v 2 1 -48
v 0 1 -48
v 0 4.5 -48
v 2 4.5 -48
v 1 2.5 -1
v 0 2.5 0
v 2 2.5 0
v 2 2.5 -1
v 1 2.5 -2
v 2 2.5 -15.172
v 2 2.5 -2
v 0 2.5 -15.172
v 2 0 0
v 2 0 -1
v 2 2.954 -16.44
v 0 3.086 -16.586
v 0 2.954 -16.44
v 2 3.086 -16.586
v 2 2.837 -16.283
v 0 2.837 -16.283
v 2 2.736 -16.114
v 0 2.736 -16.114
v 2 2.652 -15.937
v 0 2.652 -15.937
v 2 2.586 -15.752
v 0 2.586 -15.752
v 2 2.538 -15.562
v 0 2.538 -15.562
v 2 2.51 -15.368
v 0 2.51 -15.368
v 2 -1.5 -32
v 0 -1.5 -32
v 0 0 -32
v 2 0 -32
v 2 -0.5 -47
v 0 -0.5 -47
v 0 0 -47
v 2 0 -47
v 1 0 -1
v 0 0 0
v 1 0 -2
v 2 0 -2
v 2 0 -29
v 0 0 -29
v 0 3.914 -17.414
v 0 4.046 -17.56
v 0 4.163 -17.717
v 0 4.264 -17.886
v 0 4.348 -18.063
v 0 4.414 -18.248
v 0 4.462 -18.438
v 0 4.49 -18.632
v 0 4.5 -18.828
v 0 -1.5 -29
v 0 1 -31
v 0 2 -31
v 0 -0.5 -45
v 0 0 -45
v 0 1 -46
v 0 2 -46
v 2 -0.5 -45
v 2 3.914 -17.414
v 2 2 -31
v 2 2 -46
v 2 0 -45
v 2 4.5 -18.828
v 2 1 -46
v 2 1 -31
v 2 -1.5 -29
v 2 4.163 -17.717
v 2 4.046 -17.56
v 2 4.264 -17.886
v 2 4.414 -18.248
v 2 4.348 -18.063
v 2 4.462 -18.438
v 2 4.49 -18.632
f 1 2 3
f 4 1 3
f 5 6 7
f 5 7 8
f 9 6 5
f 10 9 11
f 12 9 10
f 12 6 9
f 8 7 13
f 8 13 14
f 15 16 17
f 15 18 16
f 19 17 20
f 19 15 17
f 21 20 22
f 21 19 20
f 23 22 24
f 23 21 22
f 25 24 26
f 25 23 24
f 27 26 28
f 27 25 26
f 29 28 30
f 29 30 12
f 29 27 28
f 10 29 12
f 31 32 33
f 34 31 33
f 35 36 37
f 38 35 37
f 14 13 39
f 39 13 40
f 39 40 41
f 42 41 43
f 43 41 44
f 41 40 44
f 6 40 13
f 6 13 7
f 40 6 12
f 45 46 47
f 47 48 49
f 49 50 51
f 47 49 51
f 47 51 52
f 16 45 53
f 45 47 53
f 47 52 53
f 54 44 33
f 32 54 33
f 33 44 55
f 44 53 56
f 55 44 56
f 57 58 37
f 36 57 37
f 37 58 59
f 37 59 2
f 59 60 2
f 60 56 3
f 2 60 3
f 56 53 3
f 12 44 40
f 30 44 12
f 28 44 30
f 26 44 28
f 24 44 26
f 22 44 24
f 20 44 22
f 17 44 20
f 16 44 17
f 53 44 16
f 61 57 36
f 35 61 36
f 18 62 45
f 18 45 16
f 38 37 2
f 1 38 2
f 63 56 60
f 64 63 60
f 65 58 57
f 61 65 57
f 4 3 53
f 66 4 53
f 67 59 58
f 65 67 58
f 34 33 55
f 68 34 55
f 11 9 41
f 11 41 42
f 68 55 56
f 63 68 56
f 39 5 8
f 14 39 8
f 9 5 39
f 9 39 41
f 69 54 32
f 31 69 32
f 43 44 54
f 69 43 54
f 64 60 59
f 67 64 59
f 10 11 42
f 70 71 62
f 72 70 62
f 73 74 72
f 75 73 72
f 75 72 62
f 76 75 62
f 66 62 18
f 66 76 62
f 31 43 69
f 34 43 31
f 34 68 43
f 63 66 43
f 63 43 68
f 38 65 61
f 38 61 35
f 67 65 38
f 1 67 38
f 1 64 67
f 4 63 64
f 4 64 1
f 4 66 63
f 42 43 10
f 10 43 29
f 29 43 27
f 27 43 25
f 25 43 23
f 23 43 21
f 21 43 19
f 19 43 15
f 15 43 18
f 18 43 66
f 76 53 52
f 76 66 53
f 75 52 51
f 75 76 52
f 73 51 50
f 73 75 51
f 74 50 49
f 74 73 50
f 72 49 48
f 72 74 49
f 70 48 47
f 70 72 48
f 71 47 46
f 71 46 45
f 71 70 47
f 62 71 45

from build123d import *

# Parameters (mm, degrees)
SKETCH_1_W          = 16
SKETCH_1_H          = 2.5
EXTRUDE_1_DEPTH     = 2
FILLET_1_R          = 2
SKETCH_2_W          = 1
SKETCH_2_H          = 1
CUT_EXTRUDE_1_DEPTH = 49.207883173


with BuildPart() as part:
    # Эскиз1 → Бобышка-Вытянуть1 (new body)
    with BuildSketch(Plane(origin=(0, 0, 0), x_dir=(0, 0, -1), z_dir=(1, 0, 0))):
        Polygon((48, 1), (48, 4.5), (29, 4.5), (18, 4.5), (16, 2.5), (16, 0), (29, 0), (29, -1.5), (32, -1.5), (32, 0), (31, 1), (31, 2), (46, 2), (46, 1), (45, 0), (45, -0.5), (47, -0.5), (47, 0), align=None)
        with Locations((8, 1.25)):
            Rectangle(SKETCH_1_W, SKETCH_1_H)
    extrude(amount=EXTRUDE_1_DEPTH)

    # Скругление1
    fillet_1_edges = [part.edges().sort_by_distance(p)[0] for p in [
        (1, 2.5, -16),
        (1, 4.5, -18),
    ]]
    fillet(fillet_1_edges, radius=FILLET_1_R)

    # Эскиз2 → Вырез-Вытянуть1 (cut, through all)
    with BuildSketch(Plane(origin=(0, 2.5, 0), x_dir=(1, 0, 0), z_dir=(0, 1, 0))):
        with Locations((1.5, 1.5)):
            Rectangle(SKETCH_2_W, SKETCH_2_H)
    extrude(amount=-CUT_EXTRUDE_1_DEPTH, mode=Mode.SUBTRACT)


solid = part.part
